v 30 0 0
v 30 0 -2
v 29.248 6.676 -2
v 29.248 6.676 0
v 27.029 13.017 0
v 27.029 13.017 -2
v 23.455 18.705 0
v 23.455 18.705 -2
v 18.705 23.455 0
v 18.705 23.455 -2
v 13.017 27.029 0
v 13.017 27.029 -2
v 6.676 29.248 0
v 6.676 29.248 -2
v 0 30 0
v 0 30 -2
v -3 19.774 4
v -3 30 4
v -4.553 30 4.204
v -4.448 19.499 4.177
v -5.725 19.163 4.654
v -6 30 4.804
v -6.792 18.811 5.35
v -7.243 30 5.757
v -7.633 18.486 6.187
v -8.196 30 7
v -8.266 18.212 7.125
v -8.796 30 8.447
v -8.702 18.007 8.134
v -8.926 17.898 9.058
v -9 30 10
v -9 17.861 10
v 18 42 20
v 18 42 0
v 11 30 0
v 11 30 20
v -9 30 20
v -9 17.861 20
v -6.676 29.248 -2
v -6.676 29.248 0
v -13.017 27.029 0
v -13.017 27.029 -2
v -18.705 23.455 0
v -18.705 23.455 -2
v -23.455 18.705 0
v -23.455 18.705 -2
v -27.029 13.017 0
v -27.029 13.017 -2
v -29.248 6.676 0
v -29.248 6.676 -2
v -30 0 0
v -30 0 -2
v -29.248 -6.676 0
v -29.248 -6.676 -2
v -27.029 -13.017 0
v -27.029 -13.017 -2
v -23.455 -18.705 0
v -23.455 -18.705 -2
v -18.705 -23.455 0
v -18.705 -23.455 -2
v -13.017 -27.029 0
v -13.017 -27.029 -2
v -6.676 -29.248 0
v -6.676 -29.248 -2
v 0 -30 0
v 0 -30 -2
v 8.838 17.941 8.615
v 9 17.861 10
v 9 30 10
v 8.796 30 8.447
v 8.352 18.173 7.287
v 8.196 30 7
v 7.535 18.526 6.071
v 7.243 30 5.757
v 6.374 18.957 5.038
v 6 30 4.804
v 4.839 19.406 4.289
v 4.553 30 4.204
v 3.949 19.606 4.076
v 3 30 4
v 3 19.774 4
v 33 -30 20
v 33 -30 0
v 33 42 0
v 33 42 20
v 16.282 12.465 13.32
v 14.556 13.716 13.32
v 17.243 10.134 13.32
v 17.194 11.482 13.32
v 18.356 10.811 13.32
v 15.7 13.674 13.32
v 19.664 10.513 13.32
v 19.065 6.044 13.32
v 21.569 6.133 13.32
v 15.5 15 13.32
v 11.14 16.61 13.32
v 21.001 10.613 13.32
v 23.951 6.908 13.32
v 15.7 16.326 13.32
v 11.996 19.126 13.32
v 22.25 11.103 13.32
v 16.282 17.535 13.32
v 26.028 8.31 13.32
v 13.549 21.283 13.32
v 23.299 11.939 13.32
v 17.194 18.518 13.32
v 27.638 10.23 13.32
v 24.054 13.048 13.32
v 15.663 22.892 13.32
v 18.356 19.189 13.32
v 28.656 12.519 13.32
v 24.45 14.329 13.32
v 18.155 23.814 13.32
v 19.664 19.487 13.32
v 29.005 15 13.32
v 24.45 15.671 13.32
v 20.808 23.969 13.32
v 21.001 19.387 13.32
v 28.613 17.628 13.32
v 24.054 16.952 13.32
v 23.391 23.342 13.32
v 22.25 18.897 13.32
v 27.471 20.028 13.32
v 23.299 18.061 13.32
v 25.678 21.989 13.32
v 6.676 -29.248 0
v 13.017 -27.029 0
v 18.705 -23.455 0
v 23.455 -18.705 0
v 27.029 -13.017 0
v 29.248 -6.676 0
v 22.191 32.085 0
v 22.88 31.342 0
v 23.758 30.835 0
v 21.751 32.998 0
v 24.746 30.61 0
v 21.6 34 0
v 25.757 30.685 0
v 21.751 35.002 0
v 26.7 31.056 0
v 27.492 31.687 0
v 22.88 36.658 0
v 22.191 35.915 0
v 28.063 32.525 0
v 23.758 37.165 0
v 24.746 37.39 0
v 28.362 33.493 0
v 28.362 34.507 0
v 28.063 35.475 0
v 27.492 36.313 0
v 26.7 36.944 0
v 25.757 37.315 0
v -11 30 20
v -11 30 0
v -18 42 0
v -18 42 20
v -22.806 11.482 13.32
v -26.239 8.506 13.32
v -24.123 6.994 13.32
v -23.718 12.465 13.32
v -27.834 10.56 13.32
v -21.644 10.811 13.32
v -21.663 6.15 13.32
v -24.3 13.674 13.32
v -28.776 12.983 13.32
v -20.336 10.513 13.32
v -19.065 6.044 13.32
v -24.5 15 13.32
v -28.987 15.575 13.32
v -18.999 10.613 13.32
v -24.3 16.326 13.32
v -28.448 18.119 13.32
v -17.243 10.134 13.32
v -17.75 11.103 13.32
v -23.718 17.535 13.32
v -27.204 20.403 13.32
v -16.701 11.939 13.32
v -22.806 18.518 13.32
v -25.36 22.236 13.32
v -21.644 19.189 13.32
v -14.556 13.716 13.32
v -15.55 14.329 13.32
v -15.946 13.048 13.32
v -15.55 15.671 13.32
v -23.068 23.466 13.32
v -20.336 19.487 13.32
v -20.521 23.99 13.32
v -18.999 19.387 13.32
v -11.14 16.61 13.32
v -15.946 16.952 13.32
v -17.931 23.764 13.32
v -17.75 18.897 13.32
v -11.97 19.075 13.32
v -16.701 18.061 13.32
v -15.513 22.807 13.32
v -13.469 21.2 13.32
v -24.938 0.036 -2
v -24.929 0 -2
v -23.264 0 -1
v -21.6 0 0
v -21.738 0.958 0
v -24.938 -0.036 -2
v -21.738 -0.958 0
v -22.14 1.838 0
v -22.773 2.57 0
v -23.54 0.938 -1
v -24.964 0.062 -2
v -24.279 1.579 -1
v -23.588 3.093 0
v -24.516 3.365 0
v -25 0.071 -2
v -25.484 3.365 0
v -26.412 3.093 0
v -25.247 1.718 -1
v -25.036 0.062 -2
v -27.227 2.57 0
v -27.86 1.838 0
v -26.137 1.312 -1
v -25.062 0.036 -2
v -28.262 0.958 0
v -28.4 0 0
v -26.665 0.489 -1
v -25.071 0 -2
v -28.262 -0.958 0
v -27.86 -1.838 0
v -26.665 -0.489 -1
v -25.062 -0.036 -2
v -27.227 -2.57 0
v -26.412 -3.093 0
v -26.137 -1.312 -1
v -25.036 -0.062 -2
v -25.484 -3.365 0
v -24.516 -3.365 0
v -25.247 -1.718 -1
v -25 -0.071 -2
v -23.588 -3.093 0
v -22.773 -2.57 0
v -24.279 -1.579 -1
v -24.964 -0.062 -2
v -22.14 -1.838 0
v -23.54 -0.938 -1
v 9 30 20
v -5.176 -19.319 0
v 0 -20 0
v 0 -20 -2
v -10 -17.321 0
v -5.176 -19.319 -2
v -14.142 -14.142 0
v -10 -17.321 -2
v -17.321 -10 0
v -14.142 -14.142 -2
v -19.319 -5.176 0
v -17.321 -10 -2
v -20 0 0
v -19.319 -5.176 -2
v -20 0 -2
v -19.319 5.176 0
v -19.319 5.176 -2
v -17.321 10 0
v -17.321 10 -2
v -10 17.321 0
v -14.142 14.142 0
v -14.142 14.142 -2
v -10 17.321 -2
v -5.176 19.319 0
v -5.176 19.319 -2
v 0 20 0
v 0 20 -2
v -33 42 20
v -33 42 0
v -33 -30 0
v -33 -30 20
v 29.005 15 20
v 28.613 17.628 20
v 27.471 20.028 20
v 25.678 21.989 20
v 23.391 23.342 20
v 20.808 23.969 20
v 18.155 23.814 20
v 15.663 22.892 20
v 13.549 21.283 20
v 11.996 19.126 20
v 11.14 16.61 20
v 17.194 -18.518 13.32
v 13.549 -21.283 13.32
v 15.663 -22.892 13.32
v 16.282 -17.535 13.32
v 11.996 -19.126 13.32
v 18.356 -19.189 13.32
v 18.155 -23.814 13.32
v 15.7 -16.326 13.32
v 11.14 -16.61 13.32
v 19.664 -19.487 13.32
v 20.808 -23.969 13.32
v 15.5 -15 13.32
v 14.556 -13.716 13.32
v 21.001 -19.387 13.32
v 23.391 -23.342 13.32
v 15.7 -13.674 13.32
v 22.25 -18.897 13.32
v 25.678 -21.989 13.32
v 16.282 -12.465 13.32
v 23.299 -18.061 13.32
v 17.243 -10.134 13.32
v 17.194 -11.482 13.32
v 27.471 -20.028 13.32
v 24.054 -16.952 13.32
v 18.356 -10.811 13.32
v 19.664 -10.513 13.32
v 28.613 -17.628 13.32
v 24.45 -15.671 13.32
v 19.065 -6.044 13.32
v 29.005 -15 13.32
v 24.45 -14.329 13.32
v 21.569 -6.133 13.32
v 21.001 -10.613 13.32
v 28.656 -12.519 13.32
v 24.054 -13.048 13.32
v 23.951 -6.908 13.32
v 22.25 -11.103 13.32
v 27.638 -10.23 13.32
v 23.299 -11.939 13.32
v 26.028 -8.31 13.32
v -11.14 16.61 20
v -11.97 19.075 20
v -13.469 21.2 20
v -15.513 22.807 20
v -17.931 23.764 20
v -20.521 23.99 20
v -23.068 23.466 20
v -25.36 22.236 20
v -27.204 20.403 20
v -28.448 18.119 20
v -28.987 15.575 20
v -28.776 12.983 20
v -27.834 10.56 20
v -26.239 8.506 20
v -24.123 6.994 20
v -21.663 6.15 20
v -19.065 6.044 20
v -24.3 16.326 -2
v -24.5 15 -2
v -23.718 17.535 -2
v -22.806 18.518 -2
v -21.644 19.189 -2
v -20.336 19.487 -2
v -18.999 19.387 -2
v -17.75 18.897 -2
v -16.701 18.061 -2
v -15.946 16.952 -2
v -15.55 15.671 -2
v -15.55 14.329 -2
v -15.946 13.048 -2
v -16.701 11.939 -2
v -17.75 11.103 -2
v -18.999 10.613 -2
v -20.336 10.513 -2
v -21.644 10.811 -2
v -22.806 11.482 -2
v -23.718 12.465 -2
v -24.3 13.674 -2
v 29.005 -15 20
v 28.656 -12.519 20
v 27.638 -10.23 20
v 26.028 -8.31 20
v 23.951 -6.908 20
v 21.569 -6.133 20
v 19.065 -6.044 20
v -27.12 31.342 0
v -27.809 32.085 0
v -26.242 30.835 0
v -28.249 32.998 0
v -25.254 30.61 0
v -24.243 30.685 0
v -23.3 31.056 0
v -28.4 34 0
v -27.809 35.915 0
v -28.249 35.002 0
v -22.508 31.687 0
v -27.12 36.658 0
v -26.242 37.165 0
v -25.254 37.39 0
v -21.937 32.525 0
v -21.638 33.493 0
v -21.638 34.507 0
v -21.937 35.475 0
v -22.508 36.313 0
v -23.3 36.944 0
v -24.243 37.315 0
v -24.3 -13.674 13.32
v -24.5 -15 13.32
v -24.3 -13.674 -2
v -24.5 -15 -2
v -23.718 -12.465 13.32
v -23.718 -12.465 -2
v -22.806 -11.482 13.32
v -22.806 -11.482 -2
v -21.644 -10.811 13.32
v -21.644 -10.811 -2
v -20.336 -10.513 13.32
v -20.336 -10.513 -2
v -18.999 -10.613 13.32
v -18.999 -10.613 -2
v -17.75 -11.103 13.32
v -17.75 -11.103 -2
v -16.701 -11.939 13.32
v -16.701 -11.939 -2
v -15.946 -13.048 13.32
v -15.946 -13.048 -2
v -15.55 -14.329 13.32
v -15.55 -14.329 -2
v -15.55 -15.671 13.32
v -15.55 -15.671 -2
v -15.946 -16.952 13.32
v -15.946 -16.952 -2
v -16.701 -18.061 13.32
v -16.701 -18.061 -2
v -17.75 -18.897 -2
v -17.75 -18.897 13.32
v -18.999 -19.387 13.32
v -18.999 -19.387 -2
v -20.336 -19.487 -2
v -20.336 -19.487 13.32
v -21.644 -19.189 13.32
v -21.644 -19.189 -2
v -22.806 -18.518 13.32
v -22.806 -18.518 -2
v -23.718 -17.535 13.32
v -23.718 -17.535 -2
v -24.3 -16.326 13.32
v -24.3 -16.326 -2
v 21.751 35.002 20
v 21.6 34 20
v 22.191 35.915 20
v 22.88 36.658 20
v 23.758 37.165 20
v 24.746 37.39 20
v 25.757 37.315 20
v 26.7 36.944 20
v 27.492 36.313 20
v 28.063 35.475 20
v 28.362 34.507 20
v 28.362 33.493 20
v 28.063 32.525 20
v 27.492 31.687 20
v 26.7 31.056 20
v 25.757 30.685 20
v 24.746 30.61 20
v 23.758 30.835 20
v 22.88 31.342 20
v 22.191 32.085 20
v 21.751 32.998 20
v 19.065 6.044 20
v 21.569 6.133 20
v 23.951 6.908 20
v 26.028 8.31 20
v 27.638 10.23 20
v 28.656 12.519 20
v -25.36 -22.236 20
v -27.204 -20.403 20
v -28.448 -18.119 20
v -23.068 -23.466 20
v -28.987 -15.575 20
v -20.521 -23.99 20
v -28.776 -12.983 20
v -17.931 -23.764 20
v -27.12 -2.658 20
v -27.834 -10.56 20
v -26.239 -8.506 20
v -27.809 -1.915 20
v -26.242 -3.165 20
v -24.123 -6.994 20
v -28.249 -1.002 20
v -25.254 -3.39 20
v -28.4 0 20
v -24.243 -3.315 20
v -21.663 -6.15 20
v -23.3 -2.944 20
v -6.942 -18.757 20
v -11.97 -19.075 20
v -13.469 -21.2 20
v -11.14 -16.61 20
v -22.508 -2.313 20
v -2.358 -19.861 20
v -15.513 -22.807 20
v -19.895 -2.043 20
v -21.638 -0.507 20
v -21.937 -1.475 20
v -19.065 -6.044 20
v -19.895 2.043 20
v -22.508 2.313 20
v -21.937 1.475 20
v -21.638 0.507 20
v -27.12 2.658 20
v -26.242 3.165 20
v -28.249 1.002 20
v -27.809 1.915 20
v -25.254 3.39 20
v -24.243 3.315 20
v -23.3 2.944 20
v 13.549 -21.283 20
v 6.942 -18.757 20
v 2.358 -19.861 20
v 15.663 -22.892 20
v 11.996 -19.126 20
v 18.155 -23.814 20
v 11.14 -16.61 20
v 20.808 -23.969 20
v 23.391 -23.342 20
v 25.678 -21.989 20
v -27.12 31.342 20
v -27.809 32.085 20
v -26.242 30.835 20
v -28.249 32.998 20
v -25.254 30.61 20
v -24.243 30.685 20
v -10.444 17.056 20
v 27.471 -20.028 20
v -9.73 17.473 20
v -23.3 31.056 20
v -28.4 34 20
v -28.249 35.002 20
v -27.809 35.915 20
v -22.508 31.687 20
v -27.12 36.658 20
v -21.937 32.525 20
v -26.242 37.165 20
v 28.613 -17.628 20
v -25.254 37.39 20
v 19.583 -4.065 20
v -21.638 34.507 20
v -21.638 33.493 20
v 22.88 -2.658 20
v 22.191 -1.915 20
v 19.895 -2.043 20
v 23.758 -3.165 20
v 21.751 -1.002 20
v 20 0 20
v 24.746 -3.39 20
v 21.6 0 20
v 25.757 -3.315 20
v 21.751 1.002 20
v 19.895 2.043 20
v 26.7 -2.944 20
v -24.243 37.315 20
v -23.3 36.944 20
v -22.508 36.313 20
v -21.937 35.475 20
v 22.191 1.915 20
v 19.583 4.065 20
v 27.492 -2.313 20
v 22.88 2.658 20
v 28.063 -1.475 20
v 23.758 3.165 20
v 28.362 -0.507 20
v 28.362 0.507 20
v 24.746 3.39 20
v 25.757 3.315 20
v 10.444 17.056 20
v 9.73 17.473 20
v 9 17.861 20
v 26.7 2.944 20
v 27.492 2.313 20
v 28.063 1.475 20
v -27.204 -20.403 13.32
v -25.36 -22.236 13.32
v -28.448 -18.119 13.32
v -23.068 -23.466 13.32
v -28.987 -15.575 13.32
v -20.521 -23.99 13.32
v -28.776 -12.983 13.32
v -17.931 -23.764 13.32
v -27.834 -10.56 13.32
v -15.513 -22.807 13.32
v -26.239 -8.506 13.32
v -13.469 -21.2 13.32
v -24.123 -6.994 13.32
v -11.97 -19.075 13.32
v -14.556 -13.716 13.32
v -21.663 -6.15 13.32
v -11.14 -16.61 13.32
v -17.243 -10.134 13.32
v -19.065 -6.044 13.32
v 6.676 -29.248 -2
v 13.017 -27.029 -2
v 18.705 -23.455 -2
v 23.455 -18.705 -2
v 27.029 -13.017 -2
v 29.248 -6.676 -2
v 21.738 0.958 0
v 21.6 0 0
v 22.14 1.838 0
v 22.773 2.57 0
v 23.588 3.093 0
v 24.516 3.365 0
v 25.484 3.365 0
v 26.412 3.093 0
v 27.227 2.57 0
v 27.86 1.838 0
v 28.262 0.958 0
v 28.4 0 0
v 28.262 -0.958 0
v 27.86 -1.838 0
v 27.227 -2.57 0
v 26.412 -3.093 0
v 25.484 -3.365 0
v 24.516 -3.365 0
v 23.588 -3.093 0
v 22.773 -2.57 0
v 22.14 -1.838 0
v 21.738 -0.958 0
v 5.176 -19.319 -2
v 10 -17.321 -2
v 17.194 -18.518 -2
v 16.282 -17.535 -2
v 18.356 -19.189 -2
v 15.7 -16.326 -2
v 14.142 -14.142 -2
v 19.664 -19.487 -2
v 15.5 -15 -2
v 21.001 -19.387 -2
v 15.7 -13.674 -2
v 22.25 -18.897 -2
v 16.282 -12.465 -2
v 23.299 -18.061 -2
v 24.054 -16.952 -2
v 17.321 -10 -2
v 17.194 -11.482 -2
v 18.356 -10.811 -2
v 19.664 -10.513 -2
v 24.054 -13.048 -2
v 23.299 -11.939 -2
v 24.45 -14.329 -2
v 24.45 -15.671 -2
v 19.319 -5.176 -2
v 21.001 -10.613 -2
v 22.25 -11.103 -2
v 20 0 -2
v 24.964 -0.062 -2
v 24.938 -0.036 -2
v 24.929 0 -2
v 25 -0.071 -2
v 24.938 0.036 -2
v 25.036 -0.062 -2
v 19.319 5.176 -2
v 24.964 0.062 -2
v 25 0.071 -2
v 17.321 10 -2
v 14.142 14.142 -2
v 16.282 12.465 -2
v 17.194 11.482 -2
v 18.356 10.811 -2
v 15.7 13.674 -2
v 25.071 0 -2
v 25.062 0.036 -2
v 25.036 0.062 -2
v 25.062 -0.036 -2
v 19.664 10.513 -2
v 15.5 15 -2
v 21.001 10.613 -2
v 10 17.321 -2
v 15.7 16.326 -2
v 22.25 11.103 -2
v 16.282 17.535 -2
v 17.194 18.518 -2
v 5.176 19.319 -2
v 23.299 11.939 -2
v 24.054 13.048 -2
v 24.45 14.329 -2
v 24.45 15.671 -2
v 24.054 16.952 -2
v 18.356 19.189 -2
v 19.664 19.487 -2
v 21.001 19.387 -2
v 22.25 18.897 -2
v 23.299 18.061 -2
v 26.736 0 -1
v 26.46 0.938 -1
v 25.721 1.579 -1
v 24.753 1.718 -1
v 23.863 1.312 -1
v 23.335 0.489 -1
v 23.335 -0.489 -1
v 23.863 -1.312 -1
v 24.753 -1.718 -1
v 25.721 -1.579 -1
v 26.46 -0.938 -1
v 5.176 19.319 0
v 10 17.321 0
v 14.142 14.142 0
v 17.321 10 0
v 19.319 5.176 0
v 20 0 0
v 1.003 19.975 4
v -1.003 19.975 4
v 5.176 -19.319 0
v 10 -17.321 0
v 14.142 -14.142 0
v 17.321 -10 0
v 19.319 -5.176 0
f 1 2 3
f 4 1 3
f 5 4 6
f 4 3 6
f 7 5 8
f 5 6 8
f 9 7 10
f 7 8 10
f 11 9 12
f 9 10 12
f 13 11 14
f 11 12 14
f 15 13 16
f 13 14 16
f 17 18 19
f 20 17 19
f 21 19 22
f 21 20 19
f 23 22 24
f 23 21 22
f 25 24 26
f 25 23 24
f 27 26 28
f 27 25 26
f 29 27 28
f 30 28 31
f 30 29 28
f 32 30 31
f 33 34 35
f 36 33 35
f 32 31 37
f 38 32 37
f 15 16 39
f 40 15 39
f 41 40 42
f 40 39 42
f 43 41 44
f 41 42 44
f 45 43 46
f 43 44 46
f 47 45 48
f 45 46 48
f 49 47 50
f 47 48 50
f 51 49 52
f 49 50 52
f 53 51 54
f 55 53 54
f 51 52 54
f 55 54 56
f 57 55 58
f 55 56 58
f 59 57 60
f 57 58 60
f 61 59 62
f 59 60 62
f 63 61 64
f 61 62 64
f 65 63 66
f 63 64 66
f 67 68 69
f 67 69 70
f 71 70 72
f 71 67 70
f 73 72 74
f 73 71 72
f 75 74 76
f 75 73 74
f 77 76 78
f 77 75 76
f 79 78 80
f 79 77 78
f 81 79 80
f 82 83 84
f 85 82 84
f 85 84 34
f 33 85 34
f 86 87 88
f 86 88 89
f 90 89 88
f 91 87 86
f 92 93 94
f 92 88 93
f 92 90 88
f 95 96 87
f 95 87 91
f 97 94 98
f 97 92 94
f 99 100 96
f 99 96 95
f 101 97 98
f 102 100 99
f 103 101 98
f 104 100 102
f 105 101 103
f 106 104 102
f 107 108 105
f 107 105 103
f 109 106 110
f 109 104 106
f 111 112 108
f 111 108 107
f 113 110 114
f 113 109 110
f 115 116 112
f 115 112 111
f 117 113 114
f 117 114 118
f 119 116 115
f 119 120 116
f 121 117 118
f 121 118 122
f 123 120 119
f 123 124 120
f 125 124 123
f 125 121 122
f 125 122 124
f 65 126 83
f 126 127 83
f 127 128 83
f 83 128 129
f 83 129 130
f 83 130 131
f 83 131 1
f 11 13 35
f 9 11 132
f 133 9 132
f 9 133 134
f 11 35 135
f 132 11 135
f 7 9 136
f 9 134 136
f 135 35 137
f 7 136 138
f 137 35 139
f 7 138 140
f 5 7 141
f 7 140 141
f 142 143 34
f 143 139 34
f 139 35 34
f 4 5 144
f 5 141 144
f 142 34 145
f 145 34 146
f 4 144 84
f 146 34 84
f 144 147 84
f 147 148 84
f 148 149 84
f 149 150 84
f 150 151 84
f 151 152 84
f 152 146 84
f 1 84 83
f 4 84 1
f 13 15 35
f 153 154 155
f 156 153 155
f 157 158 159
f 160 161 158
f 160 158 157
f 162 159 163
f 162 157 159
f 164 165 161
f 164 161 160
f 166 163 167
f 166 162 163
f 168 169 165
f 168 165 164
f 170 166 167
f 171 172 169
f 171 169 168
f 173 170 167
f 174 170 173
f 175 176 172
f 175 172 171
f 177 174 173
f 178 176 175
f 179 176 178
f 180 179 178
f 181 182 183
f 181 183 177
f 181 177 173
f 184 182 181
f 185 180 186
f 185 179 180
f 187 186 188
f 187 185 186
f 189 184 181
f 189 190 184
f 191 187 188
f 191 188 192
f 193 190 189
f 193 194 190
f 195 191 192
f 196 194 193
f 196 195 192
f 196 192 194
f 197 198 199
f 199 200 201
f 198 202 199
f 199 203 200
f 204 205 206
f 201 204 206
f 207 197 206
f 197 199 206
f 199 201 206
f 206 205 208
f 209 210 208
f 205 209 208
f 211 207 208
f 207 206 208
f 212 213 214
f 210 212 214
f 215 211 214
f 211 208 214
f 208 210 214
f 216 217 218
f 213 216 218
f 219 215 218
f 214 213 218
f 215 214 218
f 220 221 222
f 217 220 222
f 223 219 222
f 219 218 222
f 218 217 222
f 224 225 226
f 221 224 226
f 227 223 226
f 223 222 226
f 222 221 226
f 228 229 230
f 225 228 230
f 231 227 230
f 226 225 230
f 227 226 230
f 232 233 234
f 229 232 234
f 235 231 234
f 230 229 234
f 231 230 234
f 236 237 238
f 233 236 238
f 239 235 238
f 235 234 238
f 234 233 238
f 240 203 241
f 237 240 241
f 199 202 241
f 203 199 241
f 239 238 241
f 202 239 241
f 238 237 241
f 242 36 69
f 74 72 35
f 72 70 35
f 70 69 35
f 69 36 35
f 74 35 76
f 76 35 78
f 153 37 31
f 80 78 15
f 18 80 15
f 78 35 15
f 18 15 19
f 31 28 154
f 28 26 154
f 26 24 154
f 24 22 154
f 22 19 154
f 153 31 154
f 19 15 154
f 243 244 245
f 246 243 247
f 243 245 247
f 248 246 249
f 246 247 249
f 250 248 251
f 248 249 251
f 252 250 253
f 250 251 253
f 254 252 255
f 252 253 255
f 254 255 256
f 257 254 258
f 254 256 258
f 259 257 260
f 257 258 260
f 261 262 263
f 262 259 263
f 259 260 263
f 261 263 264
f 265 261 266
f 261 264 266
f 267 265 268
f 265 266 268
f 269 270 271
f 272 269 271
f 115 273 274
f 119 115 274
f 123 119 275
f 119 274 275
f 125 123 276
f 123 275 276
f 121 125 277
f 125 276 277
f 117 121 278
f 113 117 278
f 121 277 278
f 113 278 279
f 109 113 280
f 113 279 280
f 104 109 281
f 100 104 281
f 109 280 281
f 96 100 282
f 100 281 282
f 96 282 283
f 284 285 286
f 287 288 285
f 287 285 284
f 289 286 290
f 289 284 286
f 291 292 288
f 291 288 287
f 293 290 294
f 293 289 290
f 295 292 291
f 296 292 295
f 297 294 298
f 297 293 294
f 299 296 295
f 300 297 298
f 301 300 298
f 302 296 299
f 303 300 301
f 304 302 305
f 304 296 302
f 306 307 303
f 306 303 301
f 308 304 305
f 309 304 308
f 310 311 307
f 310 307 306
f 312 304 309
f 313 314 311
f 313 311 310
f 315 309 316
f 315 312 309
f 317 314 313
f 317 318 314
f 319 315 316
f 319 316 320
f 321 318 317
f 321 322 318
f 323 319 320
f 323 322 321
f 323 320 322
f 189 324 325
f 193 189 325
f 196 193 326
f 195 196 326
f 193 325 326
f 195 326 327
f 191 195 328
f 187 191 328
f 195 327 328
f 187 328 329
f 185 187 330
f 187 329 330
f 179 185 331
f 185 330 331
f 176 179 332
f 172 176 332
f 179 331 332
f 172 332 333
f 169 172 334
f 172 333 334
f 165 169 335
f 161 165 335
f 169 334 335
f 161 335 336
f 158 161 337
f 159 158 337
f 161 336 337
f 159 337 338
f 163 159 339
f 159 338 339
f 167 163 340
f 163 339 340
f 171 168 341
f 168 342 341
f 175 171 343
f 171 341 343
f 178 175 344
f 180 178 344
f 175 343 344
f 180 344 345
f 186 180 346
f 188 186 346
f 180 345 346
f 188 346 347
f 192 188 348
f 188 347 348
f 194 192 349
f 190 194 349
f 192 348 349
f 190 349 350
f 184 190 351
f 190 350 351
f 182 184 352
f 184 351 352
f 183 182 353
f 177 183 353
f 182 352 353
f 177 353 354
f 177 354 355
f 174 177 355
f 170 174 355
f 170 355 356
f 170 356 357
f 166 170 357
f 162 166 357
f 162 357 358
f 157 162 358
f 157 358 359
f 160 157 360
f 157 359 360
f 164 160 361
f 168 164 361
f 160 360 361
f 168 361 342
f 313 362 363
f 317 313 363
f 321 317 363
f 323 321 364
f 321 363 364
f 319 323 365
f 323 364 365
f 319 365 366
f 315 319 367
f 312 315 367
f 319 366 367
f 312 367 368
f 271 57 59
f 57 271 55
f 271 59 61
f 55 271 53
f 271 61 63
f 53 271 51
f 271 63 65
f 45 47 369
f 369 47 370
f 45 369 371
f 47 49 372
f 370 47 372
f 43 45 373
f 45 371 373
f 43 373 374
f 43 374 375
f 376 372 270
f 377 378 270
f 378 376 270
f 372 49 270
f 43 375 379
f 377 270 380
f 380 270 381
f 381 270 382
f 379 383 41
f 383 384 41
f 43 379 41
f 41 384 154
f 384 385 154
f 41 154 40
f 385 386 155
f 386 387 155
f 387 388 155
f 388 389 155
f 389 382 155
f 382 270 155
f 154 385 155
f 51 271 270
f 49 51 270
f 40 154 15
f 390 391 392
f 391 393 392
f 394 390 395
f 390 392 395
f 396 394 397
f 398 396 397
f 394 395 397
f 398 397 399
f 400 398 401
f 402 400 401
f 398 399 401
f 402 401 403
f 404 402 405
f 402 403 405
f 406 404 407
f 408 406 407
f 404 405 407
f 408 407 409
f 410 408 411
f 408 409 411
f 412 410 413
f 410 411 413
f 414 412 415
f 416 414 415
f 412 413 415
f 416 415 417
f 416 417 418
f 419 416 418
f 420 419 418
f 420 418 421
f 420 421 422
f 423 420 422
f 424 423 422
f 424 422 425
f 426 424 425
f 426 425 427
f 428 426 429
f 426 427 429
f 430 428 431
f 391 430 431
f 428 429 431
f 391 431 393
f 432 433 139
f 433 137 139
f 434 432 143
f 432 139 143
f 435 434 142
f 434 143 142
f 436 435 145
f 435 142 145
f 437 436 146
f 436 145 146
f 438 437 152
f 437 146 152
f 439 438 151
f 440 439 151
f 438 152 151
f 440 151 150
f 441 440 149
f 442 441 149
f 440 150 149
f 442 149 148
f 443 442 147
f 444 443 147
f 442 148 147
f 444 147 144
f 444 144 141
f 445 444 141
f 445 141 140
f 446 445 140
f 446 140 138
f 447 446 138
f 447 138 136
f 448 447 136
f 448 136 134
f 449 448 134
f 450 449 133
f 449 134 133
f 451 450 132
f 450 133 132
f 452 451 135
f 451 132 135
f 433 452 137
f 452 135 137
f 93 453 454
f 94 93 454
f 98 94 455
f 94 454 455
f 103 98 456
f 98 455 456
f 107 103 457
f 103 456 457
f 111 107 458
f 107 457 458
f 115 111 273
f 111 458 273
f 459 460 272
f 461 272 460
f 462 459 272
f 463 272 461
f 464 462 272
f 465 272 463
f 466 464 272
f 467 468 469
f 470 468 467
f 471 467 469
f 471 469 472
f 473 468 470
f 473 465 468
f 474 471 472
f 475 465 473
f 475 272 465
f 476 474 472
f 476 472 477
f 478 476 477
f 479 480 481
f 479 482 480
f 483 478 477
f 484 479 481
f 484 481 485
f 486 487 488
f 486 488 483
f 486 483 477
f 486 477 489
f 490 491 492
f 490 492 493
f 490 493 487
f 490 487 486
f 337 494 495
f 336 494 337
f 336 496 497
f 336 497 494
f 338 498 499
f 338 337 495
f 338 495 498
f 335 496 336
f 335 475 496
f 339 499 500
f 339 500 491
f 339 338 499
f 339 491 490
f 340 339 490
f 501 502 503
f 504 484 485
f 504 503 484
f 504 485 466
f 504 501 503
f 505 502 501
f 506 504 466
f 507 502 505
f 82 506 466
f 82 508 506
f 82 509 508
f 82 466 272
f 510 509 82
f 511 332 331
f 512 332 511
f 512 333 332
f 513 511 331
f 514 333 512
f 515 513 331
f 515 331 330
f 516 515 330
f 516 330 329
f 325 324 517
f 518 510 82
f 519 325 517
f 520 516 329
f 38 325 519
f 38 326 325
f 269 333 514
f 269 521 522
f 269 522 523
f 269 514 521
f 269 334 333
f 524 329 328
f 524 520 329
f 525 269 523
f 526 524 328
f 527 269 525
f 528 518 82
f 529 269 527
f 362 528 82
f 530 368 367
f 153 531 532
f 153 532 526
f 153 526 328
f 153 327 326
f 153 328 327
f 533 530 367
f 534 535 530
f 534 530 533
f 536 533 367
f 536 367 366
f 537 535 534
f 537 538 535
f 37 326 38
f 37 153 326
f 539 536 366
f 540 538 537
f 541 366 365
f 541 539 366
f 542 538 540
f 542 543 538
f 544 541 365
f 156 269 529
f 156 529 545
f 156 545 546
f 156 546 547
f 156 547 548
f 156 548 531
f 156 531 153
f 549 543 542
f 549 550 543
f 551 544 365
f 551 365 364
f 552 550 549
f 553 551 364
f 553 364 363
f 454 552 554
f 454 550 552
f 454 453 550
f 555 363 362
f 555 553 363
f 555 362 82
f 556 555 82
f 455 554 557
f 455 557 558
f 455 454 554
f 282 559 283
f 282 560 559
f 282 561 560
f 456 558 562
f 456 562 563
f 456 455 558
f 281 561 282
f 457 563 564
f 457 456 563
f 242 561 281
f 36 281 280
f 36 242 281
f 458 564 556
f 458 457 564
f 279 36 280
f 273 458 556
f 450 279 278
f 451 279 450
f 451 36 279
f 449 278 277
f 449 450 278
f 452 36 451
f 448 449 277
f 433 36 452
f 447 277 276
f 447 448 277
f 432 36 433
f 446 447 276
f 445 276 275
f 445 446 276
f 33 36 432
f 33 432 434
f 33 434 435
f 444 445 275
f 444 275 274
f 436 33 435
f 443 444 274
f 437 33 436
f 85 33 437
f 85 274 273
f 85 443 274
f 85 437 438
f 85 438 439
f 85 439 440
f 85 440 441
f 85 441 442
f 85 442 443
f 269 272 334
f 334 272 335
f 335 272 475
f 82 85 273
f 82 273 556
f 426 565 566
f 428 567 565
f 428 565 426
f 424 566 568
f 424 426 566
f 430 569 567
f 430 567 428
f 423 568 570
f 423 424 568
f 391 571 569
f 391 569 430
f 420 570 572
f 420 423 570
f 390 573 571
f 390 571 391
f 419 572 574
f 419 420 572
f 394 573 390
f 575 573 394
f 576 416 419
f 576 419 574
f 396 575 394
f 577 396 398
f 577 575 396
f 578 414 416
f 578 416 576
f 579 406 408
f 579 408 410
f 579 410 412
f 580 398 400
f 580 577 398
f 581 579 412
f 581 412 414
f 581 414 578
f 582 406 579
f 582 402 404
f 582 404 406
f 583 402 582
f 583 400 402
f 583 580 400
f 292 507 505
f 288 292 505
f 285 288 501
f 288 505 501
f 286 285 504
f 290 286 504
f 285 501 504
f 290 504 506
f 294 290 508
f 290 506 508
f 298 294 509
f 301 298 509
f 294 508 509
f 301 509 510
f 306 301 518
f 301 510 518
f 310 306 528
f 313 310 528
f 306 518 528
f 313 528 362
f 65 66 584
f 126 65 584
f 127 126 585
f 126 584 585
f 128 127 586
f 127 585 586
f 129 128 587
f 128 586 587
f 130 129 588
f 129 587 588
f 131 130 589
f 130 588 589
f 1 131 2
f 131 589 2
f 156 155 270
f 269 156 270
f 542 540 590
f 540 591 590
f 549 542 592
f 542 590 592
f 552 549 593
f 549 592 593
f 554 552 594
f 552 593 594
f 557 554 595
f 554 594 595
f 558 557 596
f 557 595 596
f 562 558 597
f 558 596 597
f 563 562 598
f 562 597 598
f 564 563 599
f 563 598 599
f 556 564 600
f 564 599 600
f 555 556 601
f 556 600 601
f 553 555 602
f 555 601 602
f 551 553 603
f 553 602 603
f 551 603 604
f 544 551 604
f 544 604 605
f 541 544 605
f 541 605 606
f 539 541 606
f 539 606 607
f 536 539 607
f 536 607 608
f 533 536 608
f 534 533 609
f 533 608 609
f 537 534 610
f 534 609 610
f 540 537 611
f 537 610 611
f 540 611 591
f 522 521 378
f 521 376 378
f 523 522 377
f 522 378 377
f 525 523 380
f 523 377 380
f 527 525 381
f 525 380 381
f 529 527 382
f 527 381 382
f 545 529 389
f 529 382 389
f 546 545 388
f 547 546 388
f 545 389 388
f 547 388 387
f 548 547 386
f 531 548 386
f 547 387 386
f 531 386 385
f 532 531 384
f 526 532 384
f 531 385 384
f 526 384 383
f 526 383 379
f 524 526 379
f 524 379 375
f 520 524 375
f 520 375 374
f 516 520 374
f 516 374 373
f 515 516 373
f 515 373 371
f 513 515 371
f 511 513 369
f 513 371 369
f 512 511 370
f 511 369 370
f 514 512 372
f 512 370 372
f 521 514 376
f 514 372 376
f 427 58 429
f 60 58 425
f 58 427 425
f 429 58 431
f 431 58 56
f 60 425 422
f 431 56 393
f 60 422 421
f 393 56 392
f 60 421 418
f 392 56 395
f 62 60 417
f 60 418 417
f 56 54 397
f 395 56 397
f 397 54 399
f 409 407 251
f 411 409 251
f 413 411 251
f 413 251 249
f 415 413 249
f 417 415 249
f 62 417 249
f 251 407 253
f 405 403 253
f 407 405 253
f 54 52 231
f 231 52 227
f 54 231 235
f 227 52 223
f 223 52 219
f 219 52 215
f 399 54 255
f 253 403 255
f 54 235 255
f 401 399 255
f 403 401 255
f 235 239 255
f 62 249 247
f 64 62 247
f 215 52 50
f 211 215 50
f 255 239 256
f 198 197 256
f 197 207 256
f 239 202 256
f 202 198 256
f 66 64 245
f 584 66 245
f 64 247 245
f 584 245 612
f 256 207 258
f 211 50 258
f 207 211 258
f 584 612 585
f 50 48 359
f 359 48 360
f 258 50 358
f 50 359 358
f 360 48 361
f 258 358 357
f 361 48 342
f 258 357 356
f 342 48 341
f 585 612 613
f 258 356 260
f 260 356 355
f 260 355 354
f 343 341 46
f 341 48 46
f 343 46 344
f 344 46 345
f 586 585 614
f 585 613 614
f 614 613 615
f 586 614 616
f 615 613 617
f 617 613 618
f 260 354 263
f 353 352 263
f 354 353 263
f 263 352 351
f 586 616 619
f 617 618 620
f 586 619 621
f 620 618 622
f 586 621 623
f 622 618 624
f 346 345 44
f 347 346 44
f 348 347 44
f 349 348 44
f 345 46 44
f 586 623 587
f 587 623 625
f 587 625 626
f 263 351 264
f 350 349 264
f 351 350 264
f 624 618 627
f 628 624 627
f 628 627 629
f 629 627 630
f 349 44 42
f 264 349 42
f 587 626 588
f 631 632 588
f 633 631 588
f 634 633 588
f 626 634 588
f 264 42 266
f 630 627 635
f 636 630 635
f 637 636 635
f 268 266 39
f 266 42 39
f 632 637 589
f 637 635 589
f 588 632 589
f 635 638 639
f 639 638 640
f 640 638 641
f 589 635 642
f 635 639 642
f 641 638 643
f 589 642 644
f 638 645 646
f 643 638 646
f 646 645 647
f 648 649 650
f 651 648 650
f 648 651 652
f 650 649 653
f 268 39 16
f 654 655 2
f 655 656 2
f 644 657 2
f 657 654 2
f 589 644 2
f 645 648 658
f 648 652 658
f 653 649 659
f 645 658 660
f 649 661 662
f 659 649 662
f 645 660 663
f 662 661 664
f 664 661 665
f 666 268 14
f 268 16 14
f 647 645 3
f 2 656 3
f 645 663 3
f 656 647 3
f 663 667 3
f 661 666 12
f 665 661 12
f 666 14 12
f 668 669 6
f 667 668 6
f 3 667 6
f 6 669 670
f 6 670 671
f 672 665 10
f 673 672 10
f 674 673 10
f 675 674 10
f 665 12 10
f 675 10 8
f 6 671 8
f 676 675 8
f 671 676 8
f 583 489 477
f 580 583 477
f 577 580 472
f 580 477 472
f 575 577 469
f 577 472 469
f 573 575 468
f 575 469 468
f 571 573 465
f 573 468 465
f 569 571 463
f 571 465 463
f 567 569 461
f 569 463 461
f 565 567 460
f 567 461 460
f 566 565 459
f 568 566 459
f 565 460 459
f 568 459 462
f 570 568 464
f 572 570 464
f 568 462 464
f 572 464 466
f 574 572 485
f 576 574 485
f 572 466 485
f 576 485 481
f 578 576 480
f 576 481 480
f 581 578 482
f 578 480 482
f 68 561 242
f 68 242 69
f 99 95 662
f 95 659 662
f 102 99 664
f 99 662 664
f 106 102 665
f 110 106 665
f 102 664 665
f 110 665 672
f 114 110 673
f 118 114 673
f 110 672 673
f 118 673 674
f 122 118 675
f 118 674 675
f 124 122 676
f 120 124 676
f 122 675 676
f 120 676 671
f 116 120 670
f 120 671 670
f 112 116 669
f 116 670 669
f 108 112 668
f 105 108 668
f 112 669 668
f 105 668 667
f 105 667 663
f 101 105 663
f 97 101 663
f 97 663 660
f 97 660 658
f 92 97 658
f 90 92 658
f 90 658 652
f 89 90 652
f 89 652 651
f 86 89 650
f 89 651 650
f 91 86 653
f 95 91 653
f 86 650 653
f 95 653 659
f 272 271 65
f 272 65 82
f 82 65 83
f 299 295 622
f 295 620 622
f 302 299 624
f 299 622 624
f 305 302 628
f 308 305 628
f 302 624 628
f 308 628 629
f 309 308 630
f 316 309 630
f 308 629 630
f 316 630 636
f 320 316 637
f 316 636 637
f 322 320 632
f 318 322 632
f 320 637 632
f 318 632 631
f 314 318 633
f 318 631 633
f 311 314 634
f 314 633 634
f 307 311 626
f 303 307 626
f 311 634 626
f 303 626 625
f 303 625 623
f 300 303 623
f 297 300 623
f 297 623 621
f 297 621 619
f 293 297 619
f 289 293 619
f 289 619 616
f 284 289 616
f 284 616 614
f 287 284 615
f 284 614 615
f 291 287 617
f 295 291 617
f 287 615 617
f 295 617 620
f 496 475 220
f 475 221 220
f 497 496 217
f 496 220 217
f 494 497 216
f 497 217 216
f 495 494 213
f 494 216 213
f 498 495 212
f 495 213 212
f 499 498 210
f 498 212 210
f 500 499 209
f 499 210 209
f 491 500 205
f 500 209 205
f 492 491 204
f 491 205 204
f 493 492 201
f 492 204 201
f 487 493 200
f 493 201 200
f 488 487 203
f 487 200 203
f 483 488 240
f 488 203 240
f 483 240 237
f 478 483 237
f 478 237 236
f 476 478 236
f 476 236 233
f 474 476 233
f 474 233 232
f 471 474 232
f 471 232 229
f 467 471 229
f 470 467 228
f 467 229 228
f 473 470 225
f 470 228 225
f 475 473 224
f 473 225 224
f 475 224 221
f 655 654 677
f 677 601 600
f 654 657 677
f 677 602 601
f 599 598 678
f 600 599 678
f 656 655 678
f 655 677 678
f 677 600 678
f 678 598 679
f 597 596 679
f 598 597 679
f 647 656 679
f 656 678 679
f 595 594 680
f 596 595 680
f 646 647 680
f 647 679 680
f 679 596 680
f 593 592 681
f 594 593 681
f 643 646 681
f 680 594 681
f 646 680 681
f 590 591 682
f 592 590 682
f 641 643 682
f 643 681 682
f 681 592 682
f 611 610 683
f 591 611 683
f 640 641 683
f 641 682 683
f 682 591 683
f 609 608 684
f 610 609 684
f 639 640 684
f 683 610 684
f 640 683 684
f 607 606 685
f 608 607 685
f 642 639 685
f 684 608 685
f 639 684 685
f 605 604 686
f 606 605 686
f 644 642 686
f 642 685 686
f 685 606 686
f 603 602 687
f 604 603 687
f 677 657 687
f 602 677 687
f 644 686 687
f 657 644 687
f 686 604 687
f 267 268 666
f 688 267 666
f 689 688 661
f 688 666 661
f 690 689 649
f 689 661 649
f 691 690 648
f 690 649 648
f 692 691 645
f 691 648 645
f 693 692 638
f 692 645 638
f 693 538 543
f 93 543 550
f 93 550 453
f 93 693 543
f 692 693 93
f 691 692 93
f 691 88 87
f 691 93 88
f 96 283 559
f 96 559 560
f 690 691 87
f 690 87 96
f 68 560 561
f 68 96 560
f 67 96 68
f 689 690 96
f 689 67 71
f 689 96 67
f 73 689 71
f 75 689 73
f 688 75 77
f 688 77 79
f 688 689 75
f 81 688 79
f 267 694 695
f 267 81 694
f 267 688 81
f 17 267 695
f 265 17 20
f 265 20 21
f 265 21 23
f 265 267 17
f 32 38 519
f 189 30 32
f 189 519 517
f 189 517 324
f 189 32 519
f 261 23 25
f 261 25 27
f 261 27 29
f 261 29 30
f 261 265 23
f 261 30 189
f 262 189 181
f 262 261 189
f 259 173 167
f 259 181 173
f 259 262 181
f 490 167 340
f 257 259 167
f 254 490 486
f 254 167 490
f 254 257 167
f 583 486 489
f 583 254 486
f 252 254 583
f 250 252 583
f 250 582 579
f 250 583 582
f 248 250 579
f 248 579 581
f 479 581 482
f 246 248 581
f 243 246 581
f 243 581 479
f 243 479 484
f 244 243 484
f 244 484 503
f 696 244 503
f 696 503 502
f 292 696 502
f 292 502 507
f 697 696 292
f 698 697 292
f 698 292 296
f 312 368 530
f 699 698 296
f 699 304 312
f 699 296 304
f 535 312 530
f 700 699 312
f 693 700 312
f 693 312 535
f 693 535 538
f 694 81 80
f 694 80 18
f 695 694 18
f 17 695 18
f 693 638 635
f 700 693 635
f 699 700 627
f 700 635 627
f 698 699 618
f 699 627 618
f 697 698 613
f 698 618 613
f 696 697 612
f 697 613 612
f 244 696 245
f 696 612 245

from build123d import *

# Parameters (mm, degrees)
SKETCH1_R                               = 20
BOSS_EXTRUDE1_DEPTH                     = 20
BOSS_EXTRUDE2_START                     = -2
SKETCH1_3_R                             = 20
BOSS_EXTRUDE2_DEPTH                     = 2
CBORE_FOR_M8_HEX_HEAD_BOLT1_D           = 9
CBORE_FOR_M8_HEX_HEAD_BOLT1_CBORE_D     = 18.01
CBORE_FOR_M8_HEX_HEAD_BOLT1_CBORE_DEPTH = 6.68
M8X1_25_TAPPED_HOLE1_D                  = 6.8
M8X1_25_TAPPED_HOLE1_DEPTH              = 20
M8X1_25_TAPPED_HOLE1_TIP                = 2.042926105
CUT_EXTRUDE1_DEPTH                      = 58.035076926


with BuildPart() as part:
    # Sketch1 → Boss-Extrude1 (new body)
    with BuildSketch(Plane.XY):
        Polygon((-18, 42), (-33, 42), (-33, -30), (33, -30), (33, 42), (18, 42), (11, 30), (-11, 30), align=None)
        Circle(SKETCH1_R, mode=Mode.SUBTRACT)
    extrude(amount=BOSS_EXTRUDE1_DEPTH)

    # Sketch1<3> → Boss-Extrude2 (add)
    with BuildSketch(Plane.XY.offset(BOSS_EXTRUDE2_START)):
        with BuildLine():
            ThreePointArc((-1.8e-08, 30), (-30, -3.2e-08), (4.6e-08, -30))
            ThreePointArc((4.6e-08, -30), (21.213203452, -21.213203419), (30, 0))
            ThreePointArc((30, 0), (21.213203429, 21.213203442), (-1.8e-08, 30))
        make_face()
        Circle(SKETCH1_3_R, mode=Mode.SUBTRACT)
    extrude(amount=BOSS_EXTRUDE2_DEPTH)

    # CBORE for M8 Hex Head Bolt1 (through all)
    with Locations(Plane.XY.offset(20)):
        with Locations((-20, 15), (20, 15), (-20, -15), (20, -15)):
            CounterBoreHole(CBORE_FOR_M8_HEX_HEAD_BOLT1_D / 2, CBORE_FOR_M8_HEX_HEAD_BOLT1_CBORE_D / 2, CBORE_FOR_M8_HEX_HEAD_BOLT1_CBORE_DEPTH)

    # M8x1.25 Tapped Hole1
    with Locations(Plane.XY.offset(20)):
        with Locations((-25, 34), (25, 34), (25, 0), (-25, 0)):
            Hole(M8X1_25_TAPPED_HOLE1_D / 2, depth=M8X1_25_TAPPED_HOLE1_DEPTH)
            with Locations((0, 0, -(M8X1_25_TAPPED_HOLE1_DEPTH + M8X1_25_TAPPED_HOLE1_TIP / 2))):  # 118° drill point
                Cone(0, M8X1_25_TAPPED_HOLE1_D / 2, M8X1_25_TAPPED_HOLE1_TIP, mode=Mode.SUBTRACT)

    # Sketch7 → Cut-Extrude1 (cut, through all)
    with BuildSketch(Plane(origin=(0, 0, 0), x_dir=(1, 0, 0), z_dir=(0, 1, 0))):
        with BuildLine():
            Line((-9, -20), (9, -20))
            Line((9, -20), (9, -10))
            ThreePointArc((9, -10), (7.242640687, -5.757359313), (3, -4))
            Line((3, -4), (-3, -4))
            ThreePointArc((-3, -4), (-7.242640687, -5.757359313), (-9, -10))
            Line((-9, -10), (-9, -20))
        make_face()
    extrude(amount=CUT_EXTRUDE1_DEPTH, mode=Mode.SUBTRACT)


solid = part.part
